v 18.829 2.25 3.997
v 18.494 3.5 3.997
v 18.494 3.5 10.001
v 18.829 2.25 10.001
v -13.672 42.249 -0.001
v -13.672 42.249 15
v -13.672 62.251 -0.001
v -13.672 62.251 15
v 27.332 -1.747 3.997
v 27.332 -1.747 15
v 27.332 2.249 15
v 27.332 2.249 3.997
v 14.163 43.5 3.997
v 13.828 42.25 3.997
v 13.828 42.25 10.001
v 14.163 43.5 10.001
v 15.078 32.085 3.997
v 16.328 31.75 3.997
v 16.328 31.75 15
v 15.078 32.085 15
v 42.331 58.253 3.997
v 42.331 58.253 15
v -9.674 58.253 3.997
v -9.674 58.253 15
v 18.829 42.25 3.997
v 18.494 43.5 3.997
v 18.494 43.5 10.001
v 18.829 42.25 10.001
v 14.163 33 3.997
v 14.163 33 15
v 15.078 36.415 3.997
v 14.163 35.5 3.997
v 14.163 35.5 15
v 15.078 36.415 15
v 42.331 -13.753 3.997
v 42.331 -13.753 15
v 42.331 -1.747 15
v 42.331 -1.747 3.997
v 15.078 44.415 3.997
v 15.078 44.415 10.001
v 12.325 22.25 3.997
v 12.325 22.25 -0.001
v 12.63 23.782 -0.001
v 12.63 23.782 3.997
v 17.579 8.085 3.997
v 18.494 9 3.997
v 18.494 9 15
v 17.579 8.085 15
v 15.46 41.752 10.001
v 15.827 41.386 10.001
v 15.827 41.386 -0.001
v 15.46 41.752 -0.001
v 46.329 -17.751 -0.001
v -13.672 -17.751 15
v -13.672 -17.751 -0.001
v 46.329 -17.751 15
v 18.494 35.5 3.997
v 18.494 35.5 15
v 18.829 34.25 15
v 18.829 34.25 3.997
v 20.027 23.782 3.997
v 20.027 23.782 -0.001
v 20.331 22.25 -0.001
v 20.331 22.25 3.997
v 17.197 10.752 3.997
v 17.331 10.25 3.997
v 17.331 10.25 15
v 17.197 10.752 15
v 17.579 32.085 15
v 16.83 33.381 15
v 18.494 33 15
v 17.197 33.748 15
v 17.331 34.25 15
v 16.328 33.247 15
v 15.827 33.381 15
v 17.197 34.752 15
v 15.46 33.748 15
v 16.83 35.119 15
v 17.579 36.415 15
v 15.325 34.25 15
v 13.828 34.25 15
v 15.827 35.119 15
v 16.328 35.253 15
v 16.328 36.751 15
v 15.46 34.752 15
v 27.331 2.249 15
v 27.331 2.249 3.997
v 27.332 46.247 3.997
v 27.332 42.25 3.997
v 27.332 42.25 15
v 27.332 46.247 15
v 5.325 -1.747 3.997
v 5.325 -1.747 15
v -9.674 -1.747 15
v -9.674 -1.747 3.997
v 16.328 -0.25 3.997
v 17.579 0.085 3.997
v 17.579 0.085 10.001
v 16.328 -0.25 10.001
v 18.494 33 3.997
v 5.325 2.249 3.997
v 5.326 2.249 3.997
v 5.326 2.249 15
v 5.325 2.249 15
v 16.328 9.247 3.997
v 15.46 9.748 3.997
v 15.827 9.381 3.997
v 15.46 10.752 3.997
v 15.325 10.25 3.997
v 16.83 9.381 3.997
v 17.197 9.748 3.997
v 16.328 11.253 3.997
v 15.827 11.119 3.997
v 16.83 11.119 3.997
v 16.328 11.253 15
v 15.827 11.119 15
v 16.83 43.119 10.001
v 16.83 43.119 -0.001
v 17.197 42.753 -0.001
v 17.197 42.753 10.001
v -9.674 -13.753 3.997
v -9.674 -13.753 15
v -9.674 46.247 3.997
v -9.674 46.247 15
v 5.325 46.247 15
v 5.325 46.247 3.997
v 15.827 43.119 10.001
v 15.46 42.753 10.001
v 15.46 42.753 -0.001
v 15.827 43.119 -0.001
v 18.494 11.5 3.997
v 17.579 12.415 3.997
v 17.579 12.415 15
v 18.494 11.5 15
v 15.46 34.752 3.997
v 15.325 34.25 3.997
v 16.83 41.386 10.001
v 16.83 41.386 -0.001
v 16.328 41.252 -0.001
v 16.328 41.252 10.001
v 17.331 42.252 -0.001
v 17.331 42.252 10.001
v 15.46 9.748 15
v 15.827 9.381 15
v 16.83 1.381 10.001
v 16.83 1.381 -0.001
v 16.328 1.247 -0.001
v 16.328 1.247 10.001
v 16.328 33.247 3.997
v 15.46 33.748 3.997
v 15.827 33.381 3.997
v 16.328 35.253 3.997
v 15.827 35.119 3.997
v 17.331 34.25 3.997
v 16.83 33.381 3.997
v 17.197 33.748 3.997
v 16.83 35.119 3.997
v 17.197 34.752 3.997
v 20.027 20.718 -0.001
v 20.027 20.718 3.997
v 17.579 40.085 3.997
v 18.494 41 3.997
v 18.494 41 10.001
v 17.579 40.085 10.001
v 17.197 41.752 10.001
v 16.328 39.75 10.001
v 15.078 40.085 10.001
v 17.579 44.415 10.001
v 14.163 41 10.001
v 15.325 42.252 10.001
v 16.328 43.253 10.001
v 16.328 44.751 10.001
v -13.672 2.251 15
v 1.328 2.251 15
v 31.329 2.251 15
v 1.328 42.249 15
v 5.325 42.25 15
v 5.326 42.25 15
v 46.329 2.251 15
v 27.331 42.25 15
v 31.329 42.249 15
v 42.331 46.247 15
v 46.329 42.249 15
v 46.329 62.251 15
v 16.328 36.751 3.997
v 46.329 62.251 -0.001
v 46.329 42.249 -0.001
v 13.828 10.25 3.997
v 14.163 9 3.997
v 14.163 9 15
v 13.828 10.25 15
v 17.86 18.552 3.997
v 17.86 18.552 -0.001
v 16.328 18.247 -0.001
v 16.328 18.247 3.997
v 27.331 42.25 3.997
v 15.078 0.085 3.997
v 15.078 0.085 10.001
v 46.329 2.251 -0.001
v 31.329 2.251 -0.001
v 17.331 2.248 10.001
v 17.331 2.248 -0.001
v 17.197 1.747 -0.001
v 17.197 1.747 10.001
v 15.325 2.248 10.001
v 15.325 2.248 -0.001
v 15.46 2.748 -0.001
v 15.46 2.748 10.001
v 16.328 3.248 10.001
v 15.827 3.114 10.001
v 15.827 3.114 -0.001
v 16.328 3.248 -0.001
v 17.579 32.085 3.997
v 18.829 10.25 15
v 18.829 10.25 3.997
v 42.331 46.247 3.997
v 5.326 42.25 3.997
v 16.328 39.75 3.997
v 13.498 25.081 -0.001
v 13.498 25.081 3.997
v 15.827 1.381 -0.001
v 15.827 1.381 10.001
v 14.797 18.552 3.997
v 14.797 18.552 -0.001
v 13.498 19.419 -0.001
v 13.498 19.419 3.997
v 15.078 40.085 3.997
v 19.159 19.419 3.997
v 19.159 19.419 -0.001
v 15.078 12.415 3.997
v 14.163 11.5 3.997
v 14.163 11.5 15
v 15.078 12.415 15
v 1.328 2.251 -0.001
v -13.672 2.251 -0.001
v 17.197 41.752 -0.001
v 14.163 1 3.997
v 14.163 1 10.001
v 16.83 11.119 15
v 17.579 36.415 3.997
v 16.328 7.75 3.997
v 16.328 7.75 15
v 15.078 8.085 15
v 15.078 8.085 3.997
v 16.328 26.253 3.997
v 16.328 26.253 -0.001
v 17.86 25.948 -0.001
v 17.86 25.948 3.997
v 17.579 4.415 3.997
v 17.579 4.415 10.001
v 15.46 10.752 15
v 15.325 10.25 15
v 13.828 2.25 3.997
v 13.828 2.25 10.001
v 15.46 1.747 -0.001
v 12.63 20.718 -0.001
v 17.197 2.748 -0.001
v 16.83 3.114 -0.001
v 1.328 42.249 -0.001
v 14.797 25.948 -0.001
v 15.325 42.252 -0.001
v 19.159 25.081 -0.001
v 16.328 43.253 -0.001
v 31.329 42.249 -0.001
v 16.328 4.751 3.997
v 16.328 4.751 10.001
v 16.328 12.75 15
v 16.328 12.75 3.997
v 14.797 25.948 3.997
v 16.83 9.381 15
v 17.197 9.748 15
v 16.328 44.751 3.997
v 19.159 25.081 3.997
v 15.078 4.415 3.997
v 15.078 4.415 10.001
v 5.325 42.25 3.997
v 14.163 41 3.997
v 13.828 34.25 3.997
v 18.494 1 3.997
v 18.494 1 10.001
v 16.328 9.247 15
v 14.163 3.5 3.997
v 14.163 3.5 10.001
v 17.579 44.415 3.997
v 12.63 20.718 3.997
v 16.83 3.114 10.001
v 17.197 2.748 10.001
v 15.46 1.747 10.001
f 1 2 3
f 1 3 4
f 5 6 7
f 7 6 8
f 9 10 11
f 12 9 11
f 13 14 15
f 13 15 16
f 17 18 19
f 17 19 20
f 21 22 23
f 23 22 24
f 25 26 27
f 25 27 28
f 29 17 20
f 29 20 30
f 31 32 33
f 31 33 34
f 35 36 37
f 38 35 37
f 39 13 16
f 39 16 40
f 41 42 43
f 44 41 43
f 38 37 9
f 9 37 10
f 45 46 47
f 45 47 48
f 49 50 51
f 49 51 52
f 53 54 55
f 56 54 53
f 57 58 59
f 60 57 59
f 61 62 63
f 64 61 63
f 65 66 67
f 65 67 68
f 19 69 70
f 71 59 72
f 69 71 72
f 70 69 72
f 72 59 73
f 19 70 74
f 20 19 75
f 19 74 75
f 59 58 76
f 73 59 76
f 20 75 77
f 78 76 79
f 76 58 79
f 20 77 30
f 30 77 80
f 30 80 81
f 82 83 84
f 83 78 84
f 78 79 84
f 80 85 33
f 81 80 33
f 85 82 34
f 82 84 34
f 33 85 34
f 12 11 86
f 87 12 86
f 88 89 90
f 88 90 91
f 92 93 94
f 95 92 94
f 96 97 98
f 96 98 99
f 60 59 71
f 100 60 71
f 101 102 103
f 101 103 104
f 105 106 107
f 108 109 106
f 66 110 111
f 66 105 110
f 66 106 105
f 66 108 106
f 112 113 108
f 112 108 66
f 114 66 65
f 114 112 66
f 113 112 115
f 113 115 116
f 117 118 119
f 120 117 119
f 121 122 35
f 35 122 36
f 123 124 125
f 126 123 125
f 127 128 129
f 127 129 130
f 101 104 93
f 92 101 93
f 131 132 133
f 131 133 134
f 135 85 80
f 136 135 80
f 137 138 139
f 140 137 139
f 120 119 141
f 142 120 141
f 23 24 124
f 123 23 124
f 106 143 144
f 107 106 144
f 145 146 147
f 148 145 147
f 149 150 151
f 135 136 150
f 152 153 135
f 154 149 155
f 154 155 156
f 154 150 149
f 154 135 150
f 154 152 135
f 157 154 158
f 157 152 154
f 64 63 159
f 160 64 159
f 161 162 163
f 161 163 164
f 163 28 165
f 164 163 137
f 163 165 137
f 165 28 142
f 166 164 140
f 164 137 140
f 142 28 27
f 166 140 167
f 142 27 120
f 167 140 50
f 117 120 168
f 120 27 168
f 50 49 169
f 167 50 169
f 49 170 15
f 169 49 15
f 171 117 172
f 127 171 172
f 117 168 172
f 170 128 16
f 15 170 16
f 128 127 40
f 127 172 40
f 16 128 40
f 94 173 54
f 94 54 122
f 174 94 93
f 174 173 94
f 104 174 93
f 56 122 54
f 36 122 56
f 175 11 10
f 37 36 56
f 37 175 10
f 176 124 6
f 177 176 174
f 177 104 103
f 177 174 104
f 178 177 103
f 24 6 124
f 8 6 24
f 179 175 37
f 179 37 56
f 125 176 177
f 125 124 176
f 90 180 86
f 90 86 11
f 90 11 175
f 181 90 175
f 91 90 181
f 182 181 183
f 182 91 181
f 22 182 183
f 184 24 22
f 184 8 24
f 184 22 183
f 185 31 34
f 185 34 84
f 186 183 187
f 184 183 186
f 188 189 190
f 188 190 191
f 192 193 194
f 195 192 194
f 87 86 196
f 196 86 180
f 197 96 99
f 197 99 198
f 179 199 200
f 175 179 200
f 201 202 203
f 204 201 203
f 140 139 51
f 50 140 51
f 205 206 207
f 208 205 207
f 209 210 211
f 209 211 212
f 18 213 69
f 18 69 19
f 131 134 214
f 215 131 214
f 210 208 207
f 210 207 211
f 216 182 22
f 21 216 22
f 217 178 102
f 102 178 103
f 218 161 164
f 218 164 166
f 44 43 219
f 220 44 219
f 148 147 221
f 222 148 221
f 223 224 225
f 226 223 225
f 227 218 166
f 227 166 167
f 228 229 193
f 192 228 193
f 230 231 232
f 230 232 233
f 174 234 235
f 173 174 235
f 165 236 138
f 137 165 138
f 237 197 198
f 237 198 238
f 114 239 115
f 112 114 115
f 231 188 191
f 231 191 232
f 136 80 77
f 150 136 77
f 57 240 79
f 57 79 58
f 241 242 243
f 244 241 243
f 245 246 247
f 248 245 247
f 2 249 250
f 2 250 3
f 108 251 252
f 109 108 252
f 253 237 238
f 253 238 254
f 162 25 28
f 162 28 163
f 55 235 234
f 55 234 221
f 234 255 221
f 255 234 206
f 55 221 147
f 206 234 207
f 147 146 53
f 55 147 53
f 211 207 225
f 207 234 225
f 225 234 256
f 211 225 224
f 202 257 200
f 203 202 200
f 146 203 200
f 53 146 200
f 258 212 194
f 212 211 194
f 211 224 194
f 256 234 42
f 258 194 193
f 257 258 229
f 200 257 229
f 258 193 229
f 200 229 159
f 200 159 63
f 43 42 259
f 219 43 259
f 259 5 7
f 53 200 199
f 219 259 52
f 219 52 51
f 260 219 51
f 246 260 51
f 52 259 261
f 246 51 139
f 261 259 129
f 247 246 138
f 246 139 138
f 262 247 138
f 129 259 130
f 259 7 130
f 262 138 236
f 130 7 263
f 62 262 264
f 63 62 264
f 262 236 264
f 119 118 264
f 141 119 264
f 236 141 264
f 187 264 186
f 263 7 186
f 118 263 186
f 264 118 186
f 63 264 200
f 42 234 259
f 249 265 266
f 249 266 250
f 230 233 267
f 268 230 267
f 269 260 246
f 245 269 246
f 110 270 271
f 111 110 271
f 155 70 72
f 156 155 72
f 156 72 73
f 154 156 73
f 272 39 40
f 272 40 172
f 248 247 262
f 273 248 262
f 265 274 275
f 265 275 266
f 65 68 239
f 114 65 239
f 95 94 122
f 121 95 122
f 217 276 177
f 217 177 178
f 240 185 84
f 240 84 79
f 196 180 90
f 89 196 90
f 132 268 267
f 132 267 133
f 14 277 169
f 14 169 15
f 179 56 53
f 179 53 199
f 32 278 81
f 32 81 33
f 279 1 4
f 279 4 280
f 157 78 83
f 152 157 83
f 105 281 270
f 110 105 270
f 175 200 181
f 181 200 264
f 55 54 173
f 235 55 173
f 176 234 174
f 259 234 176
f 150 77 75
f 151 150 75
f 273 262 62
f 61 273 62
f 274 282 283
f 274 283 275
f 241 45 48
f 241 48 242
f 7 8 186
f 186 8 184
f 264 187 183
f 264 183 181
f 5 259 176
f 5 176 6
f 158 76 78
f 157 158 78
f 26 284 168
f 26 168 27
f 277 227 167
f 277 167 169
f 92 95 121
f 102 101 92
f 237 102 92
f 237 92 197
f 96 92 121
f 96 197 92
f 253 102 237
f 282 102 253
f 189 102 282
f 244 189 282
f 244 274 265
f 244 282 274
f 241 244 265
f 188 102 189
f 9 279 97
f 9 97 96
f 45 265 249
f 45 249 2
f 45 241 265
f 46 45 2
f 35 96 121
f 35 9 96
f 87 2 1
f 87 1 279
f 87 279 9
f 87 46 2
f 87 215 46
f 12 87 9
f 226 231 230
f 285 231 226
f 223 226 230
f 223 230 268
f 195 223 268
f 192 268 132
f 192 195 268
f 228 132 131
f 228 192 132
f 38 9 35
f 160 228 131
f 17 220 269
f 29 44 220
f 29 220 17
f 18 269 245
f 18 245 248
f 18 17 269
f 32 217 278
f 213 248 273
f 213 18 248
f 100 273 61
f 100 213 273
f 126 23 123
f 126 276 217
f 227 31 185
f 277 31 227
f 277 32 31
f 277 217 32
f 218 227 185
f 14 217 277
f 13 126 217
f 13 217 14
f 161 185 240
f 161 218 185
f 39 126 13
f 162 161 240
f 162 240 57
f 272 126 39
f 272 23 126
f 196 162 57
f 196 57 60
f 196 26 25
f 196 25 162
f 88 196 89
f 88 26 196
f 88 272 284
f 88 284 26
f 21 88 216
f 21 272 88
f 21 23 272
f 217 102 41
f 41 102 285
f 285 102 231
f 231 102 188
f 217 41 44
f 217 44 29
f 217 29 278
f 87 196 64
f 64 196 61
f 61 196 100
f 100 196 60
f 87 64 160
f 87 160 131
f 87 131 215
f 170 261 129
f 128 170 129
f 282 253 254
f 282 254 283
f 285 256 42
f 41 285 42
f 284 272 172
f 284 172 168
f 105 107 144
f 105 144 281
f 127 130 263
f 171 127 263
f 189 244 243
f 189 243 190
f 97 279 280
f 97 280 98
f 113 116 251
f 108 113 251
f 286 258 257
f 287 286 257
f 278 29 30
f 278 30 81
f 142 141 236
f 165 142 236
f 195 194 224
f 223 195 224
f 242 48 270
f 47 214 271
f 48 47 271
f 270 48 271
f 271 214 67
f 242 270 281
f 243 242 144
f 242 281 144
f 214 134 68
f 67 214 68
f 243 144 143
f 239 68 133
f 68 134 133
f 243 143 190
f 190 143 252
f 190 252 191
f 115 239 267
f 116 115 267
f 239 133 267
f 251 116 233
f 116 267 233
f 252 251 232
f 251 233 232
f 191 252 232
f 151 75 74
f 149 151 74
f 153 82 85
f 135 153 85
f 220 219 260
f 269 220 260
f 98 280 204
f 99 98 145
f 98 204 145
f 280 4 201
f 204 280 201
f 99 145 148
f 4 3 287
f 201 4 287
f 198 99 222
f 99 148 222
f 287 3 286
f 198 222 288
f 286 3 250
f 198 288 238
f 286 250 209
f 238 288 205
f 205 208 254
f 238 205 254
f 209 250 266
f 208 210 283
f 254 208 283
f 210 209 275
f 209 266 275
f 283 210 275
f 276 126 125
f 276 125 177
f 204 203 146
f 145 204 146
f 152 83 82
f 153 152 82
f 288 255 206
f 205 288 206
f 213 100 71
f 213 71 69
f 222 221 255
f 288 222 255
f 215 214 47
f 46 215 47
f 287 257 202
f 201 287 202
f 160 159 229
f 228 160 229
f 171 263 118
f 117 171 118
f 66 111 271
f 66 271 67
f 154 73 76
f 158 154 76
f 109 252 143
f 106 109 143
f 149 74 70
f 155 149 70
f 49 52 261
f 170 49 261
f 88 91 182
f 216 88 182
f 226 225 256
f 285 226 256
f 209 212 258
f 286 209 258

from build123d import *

# Parameters (mm, degrees)
SKETCH1_W           = 60.000998497
SKETCH1_H           = 80.001998902
BOSS_EXTRUDE1_DEPTH = 15.001
SKETCH2_W           = 14.999998093
SKETCH2_H           = 39.998000621
CUT_EXTRUDE1_DEPTH  = 80.035391071
SKETCH3_W           = 14.99999988
SKETCH3_H           = 39.998000621
CUT_EXTRUDE2_DEPTH  = 80.035391071
CUT_EXTRUDE3_DEPTH  = 11.003000021
BOSS_EXTRUDE2_DEPTH = 6.004000425
CUT_EXTRUDE4_DEPTH  = 80.035391071
CUT_EXTRUDE5_DEPTH  = 80.035391071
BOSS_EXTRUDE3_DEPTH = 6.004000425
CUT_EXTRUDE6_DEPTH  = 80.035391071
BOSS_EXTRUDE4_DEPTH = 11.003000021
CUT_EXTRUDE7_DEPTH  = 11.003000021
BOSS_EXTRUDE5_DEPTH = 11.003000021
CUT_EXTRUDE8_DEPTH  = 11.003000021


with BuildPart() as part:
    # Sketch1 → Boss-Extrude1 (new body)
    with BuildSketch(Plane.XY.offset(15)):
        with Locations((16.328499318, 22.25)):
            Rectangle(SKETCH1_W, SKETCH1_H)
    extrude(amount=-BOSS_EXTRUDE1_DEPTH)

    # Sketch2 → Cut-Extrude1 (cut, through all)
    with BuildSketch(Plane(origin=(0, 0, -0.001), x_dir=(-1, 0, 0), z_dir=(0, 0, -1))):
        with Locations((-38.82899952, 22.250000239)):
            Rectangle(SKETCH2_W, SKETCH2_H)
    extrude(amount=-CUT_EXTRUDE1_DEPTH, mode=Mode.SUBTRACT)

    # Sketch3 → Cut-Extrude2 (cut, through all)
    with BuildSketch(Plane(origin=(0, 0, -0.001), x_dir=(-1, 0, 0), z_dir=(0, 0, -1))):
        with Locations((6.171999991, 22.250000239)):
            Rectangle(SKETCH3_W, SKETCH3_H)
    extrude(amount=-CUT_EXTRUDE2_DEPTH, mode=Mode.SUBTRACT)

    # Sketch4 → Cut-Extrude3 (cut)
    with BuildSketch(Plane.XY.offset(15)):
        Polygon((27.332000732, 42.25), (27.332000732, 46.247001648), (42.331001282, 46.247001648), (42.331001282, 58.252998352), (-9.673999786, 58.252998352), (-9.673999786, 46.247001648), (5.324999809, 46.247001648), (5.324999809, 42.25), (5.326000214, 42.25), (5.326000214, 2.249000072), (5.324999809, 2.249000072), (5.324999809, -1.746999979), (-9.673999786, -1.746999979), (-9.673999786, -13.753000259), (42.331001282, -13.753000259), (42.331001282, -1.746999979), (27.332000732, -1.746999979), (27.332000732, 2.249000072), (27.330999374, 2.249000072), (27.330999374, 42.25), align=None)
    extrude(amount=-CUT_EXTRUDE3_DEPTH, mode=Mode.SUBTRACT)

    # Sketch5 → Boss-Extrude2 (add)
    with BuildSketch(Plane.XY.offset(3.996999979)):
        Polygon((16.327999115, 4.750999928), (17.579000473, 4.414999962), (18.493999481, 3.5), (18.829000473, 2.25), (18.493999481, 1), (17.579000473, 0.085000001), (16.327999115, -0.25), (15.078000069, 0.085000001), (14.163000107, 1), (13.828000069, 2.25), (14.163000107, 3.5), (15.078000069, 4.414999962), align=None)
    extrude(amount=BOSS_EXTRUDE2_DEPTH)

    # Sketch6 → Cut-Extrude4 (cut, through all)
    with BuildSketch(Plane(origin=(0, 0, -0.001), x_dir=(-1, 0, 0), z_dir=(0, 0, -1))):
        Polygon((-16.829999924, 3.114000082), (-17.197000504, 2.747999907), (-17.330999374, 2.247999907), (-17.197000504, 1.746999979), (-16.829999924, 1.381000042), (-16.327999115, 1.246999979), (-15.826999664, 1.381000042), (-15.460000038, 1.746999979), (-15.324999809, 2.247999907), (-15.460000038, 2.747999907), (-15.826999664, 3.114000082), (-16.327999115, 3.247999907), align=None)
    extrude(amount=-CUT_EXTRUDE4_DEPTH, mode=Mode.SUBTRACT)

    # Sketch7 → Cut-Extrude5 (cut, through all)
    with BuildSketch(Plane(origin=(0, 0, -0.001), x_dir=(-1, 0, 0), z_dir=(0, 0, -1))):
        Polygon((-13.498000145, 19.419000626), (-12.630000114, 20.718000412), (-12.324999809, 22.25), (-12.630000114, 23.781999588), (-13.498000145, 25.080999374), (-14.796999931, 25.947999954), (-16.327999115, 26.253000259), (-17.86000061, 25.947999954), (-19.159000397, 25.080999374), (-20.027000427, 23.781999588), (-20.330999374, 22.25), (-20.027000427, 20.718000412), (-19.159000397, 19.419000626), (-17.86000061, 18.552000046), (-16.327999115, 18.246999741), (-14.796999931, 18.552000046), align=None)
    extrude(amount=-CUT_EXTRUDE5_DEPTH, mode=Mode.SUBTRACT)

    # Sketch8 → Boss-Extrude3 (add)
    with BuildSketch(Plane.XY.offset(3.996999979)):
        Polygon((15.078000069, 40.084999084), (14.163000107, 41), (13.828000069, 42.25), (14.163000107, 43.5), (15.078000069, 44.415000916), (16.327999115, 44.750999451), (17.579000473, 44.415000916), (18.493999481, 43.5), (18.829000473, 42.25), (18.493999481, 41), (17.579000473, 40.084999084), (16.327999115, 39.75), align=None)
    extrude(amount=BOSS_EXTRUDE3_DEPTH)

    # Sketch9 → Cut-Extrude6 (cut, through all)
    with BuildSketch(Plane(origin=(0, 0, -0.001), x_dir=(-1, 0, 0), z_dir=(0, 0, -1))):
        Polygon((-15.826999664, 41.386001587), (-15.460000038, 41.751998901), (-15.324999809, 42.251998901), (-15.460000038, 42.752998352), (-15.826999664, 43.118999481), (-16.327999115, 43.252998352), (-16.829999924, 43.118999481), (-17.197000504, 42.752998352), (-17.330999374, 42.251998901), (-17.197000504, 41.751998901), (-16.829999924, 41.386001587), (-16.327999115, 41.251998901), align=None)
    extrude(amount=-CUT_EXTRUDE6_DEPTH, mode=Mode.SUBTRACT)

    # Sketch10 → Boss-Extrude4 (add)
    with BuildSketch(Plane.XY.offset(3.996999979)):
        Polygon((14.163000107, 9), (13.828000069, 10.25), (14.163000107, 11.5), (15.078000069, 12.414999962), (16.327999115, 12.75), (17.579000473, 12.414999962), (18.493999481, 11.5), (18.829000473, 10.25), (18.493999481, 9), (17.579000473, 8.085000038), (16.327999115, 7.75), (15.078000069, 8.085000038), align=None)
    extrude(amount=BOSS_EXTRUDE4_DEPTH)

    # Sketch11 → Cut-Extrude7 (cut)
    with BuildSketch(Plane.XY.offset(15)):
        Polygon((16.829999924, 9.380999565), (17.197000504, 9.748000145), (17.330999374, 10.25), (17.197000504, 10.751999855), (16.829999924, 11.119000435), (16.327999115, 11.253000259), (15.826999664, 11.119000435), (15.460000038, 10.751999855), (15.324999809, 10.25), (15.460000038, 9.748000145), (15.826999664, 9.380999565), (16.327999115, 9.246999741), align=None)
    extrude(amount=-CUT_EXTRUDE7_DEPTH, mode=Mode.SUBTRACT)

    # Sketch12 → Boss-Extrude5 (add)
    with BuildSketch(Plane.XY.offset(3.996999979)):
        Polygon((17.579000473, 36.415000916), (18.493999481, 35.5), (18.829000473, 34.25), (18.493999481, 33), (17.579000473, 32.084999084), (16.327999115, 31.75), (15.078000069, 32.084999084), (14.163000107, 33), (13.828000069, 34.25), (14.163000107, 35.5), (15.078000069, 36.415000916), (16.327999115, 36.750999451), align=None)
    extrude(amount=BOSS_EXTRUDE5_DEPTH)

    # Sketch13 → Cut-Extrude8 (cut)
    with BuildSketch(Plane.XY.offset(15)):
        Polygon((15.826999664, 35.118999481), (15.460000038, 34.751998901), (15.324999809, 34.25), (15.460000038, 33.748001099), (15.826999664, 33.381000519), (16.327999115, 33.247001648), (16.829999924, 33.381000519), (17.197000504, 33.748001099), (17.330999374, 34.25), (17.197000504, 34.751998901), (16.829999924, 35.118999481), (16.327999115, 35.252998352), align=None)
    extrude(amount=-CUT_EXTRUDE8_DEPTH, mode=Mode.SUBTRACT)


solid = part.part
